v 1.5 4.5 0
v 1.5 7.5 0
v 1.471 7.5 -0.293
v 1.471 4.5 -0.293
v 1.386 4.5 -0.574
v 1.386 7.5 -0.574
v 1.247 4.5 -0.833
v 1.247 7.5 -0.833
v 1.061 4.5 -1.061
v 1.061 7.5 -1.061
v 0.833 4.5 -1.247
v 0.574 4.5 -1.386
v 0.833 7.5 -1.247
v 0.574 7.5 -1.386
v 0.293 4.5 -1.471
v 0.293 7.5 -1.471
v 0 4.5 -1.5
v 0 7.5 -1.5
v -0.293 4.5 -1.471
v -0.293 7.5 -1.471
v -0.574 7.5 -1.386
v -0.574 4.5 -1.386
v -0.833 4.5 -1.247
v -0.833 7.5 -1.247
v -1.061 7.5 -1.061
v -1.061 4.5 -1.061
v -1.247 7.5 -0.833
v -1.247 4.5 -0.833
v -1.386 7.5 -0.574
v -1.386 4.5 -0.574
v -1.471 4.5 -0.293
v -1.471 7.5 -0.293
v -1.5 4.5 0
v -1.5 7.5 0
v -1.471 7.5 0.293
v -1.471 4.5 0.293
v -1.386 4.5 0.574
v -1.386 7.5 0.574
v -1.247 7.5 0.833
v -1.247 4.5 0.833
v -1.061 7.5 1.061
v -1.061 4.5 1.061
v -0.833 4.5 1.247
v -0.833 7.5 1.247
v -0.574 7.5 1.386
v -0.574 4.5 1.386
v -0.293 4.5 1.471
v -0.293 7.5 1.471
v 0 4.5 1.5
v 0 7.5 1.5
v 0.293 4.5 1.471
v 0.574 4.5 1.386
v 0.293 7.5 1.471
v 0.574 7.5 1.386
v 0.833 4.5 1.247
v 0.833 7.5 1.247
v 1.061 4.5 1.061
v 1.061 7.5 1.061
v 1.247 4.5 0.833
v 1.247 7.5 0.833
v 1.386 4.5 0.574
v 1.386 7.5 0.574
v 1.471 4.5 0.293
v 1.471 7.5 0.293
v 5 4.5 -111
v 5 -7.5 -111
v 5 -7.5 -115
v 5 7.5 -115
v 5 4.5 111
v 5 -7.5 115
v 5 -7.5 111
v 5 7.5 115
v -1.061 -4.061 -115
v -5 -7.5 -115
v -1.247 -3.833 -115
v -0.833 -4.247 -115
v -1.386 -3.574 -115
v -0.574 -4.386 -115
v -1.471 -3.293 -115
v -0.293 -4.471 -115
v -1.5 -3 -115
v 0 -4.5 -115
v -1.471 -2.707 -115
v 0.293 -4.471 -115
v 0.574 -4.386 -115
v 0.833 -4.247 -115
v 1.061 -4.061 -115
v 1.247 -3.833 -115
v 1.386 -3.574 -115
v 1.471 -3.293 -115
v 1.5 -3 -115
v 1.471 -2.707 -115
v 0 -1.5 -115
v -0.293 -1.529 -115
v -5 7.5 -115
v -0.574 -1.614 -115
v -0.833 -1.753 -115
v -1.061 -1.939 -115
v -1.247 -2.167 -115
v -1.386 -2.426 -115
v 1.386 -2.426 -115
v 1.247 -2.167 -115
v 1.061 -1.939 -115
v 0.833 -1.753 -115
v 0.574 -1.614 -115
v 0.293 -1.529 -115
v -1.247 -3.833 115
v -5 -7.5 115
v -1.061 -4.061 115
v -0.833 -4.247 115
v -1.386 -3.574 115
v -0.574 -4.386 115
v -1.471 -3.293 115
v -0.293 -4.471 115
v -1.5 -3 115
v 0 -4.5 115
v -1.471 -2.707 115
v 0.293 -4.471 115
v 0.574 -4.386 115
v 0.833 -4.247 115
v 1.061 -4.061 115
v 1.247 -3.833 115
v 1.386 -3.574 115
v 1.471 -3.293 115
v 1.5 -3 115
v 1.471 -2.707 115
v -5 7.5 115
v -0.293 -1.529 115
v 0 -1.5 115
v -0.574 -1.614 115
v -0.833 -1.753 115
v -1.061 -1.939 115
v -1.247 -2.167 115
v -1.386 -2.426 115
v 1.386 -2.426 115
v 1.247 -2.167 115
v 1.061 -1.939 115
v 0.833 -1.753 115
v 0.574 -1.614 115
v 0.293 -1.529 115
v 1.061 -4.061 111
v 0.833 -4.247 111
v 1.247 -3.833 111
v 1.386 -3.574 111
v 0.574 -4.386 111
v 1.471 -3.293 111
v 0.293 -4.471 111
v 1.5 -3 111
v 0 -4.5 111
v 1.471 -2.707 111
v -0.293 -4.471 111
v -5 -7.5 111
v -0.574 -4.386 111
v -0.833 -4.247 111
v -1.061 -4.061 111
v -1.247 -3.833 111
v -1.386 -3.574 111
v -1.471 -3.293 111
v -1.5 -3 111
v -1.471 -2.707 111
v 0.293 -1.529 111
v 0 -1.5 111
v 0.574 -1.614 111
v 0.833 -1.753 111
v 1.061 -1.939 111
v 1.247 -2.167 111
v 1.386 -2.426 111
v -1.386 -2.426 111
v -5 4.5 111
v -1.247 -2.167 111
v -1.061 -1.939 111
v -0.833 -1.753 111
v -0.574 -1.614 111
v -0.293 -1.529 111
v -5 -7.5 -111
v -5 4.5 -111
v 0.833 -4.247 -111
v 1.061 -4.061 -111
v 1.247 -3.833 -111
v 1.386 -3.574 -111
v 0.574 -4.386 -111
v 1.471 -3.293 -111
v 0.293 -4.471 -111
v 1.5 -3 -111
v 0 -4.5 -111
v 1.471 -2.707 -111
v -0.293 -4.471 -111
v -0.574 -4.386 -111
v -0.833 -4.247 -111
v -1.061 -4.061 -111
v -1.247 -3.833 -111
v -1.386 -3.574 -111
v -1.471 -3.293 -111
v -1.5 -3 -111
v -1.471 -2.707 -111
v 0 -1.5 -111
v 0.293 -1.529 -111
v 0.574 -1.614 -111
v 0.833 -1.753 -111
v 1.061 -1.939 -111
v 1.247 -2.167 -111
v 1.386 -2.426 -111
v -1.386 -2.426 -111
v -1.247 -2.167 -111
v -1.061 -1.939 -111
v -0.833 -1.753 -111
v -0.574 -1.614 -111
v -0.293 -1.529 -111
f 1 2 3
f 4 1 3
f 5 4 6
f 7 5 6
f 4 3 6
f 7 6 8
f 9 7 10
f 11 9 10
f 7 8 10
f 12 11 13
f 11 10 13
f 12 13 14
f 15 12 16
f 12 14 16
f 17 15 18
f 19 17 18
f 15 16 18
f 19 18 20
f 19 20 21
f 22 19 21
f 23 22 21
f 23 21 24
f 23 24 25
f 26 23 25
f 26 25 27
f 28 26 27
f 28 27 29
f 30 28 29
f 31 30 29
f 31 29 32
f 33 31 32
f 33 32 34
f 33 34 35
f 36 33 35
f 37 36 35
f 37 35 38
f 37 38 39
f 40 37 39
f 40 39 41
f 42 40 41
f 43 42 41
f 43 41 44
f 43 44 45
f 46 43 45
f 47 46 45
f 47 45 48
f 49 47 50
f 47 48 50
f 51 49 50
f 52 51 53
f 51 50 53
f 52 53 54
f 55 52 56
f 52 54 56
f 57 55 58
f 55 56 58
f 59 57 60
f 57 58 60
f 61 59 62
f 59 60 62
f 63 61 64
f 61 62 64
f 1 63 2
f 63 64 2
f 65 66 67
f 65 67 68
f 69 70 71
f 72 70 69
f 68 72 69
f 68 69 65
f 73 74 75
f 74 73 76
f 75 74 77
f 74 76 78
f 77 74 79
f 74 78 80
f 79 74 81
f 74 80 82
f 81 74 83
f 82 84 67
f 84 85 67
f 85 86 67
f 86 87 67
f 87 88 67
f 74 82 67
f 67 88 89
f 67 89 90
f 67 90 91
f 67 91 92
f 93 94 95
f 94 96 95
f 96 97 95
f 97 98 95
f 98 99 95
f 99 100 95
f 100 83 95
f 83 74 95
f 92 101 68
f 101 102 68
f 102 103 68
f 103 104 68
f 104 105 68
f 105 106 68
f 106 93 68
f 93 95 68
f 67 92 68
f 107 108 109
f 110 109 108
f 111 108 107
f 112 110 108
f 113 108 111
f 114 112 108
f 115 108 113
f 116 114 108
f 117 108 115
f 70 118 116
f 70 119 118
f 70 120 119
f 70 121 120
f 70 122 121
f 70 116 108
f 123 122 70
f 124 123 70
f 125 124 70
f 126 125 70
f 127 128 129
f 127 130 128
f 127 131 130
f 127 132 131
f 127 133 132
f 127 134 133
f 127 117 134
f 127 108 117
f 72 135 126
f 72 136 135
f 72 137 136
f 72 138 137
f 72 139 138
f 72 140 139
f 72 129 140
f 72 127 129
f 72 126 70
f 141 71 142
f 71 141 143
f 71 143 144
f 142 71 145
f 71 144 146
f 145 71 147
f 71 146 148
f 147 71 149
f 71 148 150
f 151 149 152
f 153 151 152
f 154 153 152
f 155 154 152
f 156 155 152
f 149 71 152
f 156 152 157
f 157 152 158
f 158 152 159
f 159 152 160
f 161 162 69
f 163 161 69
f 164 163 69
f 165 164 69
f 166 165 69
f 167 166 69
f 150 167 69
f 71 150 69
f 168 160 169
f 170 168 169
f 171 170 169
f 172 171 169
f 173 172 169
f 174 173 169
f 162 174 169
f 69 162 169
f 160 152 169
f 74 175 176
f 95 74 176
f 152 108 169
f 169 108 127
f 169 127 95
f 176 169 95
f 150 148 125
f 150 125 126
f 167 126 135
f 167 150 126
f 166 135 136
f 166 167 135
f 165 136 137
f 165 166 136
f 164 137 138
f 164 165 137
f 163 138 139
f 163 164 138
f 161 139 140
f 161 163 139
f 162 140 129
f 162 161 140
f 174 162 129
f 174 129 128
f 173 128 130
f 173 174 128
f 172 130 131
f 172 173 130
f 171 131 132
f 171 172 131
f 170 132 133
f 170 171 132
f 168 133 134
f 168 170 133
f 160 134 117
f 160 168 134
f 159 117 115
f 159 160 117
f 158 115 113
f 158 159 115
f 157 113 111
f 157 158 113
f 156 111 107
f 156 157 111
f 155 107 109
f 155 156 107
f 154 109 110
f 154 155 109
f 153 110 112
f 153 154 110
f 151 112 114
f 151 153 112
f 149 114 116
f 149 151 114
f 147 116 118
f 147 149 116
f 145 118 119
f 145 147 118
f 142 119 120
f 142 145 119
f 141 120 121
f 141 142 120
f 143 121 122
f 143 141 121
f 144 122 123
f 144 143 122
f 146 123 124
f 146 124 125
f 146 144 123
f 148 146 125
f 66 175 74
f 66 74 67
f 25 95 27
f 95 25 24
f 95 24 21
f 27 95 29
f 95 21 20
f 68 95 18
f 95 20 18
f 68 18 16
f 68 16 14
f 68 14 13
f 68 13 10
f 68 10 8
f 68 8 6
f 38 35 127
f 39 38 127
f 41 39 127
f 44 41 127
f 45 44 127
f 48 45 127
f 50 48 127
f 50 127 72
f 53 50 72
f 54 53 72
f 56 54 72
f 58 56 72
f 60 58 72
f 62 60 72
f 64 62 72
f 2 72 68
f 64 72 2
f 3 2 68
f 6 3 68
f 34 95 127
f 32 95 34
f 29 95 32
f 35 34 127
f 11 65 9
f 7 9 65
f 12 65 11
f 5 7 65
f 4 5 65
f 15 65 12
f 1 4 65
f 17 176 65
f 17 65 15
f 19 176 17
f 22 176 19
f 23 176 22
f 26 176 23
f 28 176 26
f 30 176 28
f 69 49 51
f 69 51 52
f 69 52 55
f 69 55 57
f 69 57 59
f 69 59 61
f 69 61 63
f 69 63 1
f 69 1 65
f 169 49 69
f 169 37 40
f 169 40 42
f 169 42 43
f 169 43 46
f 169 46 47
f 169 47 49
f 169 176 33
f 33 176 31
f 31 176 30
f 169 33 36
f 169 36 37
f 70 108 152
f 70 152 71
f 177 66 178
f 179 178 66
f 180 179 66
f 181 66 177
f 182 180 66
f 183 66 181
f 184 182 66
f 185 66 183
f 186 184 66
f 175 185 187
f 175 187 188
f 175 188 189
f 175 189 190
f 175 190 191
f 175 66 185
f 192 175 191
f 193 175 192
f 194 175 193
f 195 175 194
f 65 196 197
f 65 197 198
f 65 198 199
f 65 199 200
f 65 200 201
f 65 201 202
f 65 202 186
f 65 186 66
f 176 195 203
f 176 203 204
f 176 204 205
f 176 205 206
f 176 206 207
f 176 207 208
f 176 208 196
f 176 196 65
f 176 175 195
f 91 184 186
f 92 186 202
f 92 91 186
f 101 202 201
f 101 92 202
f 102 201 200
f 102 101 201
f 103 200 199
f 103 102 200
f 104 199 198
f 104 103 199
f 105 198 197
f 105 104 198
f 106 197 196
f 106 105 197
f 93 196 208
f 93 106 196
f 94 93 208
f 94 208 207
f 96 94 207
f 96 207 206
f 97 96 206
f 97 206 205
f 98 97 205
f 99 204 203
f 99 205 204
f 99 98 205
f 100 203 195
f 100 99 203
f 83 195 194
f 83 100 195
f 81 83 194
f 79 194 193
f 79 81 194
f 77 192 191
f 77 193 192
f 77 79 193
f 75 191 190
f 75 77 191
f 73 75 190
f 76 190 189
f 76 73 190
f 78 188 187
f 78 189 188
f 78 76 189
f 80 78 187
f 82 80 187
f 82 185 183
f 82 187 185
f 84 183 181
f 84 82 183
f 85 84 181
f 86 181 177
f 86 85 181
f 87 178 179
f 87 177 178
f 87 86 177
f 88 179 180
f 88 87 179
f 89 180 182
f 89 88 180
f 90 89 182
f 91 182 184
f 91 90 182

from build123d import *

# Parameters (mm, degrees)
CROQUIS1_W              = 10
CROQUIS1_H              = 15
CROQUIS1_R              = 1.5
SALIENTE_EXTRUIR1_DEPTH = 115
CROQUIS2_W              = 222
CROQUIS2_H              = 12
CORTAR_EXTRUIR1_DEPTH   = 11
CROQUIS3_R              = 1.5
CORTAR_EXTRUIR2_DEPTH   = 10


with BuildPart() as part:
    # Croquis1 → Saliente-Extruir1 (new body, symmetric)
    with BuildSketch(Plane.XY):
        Rectangle(CROQUIS1_W, CROQUIS1_H)
        with Locations((0, -3)):
            Circle(CROQUIS1_R, mode=Mode.SUBTRACT)
    extrude(amount=SALIENTE_EXTRUIR1_DEPTH, both=True)

    # Croquis2 → Cortar-Extruir1 (cut, through all)
    with BuildSketch(Plane.ZY.offset(5)):
        with Locations((0, -1.5)):
            Rectangle(CROQUIS2_W, CROQUIS2_H)
    extrude(amount=-CORTAR_EXTRUIR1_DEPTH, mode=Mode.SUBTRACT)

    # Croquis3 → Cortar-Extruir2 (cut)
    with BuildSketch(Plane(origin=(0, 7.5, 0), x_dir=(1, 0, 0), z_dir=(0, 1, 0))):
        Circle(CROQUIS3_R)
    extrude(amount=-CORTAR_EXTRUIR2_DEPTH, mode=Mode.SUBTRACT)


solid = part.part
